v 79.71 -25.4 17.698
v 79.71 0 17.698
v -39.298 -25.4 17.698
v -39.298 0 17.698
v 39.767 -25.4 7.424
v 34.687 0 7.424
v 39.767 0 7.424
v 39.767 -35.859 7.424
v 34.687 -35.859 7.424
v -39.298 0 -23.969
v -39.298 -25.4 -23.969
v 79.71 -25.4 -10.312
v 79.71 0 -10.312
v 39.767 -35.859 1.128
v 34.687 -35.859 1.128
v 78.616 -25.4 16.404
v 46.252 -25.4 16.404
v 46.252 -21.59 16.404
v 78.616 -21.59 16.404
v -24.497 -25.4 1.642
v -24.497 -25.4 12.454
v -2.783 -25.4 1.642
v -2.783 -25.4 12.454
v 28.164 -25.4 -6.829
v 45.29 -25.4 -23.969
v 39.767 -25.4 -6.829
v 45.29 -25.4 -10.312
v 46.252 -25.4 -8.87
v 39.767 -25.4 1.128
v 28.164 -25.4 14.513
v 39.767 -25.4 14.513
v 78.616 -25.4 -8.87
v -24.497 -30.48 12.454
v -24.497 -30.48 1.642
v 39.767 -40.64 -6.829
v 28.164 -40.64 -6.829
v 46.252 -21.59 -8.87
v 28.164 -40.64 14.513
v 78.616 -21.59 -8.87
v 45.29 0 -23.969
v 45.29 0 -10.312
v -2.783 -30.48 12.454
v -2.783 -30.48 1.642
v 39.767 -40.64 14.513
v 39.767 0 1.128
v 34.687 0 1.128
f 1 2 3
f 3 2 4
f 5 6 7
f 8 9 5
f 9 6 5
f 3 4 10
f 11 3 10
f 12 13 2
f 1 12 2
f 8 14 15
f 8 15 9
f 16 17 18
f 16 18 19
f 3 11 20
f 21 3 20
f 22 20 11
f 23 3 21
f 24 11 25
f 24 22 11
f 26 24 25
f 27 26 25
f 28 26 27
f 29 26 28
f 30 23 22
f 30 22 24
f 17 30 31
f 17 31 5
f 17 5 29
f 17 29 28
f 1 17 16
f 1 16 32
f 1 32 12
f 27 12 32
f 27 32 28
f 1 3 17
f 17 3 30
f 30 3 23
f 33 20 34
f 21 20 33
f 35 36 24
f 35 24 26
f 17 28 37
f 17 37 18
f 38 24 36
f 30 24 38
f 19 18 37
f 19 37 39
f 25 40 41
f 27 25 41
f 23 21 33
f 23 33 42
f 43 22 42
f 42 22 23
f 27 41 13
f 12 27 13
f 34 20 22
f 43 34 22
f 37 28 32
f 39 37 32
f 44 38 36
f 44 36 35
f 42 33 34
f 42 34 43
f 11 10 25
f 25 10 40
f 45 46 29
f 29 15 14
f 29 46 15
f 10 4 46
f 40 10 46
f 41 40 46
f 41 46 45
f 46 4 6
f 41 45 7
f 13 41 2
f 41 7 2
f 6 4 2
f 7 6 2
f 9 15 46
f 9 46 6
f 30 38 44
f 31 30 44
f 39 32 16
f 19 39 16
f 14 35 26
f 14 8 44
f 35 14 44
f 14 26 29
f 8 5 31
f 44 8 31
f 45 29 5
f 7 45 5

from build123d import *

# Parameters (mm, degrees)
F0_W      = 34.420416
F0_H      = 28.010136
F1_DEPTH  = 25.4
F2_W      = 21.713977
F2_H      = 10.812225
F3_DEPTH  = 5.08
F4_W      = 32.364089
F4_H      = 25.274814
F5_DEPTH  = 3.81
F6_W      = 11.602566
F6_H      = 21.341514
F7_DEPTH  = 15.24
F8_W      = 10.458534
F8_H      = 6.296051
F9_DEPTH  = 5.08
F10_W     = 5.08
F10_H     = 6.296051
F11_DEPTH = 25.4


with BuildPart() as f1:
    # F0 (on Front) → F1 (new body)
    with BuildSketch(Plane.XZ):
        Polygon((45.290023, 17.697947), (-39.297804, 17.697947), (-39.297804, -23.968874), (45.290023, -23.968874), (45.290023, -10.312189), align=None)
        with Locations((62.500231, 3.692879)):
            Rectangle(F0_W, F0_H)
    extrude(amount=F1_DEPTH)

    # F2 (on face) → F3 (join)
    with BuildSketch(Plane.XZ.offset(25.4)):
        with Locations((-13.639831, 7.048171)):
            Rectangle(F2_W, F2_H)
    extrude(amount=F3_DEPTH)

    # F4 (on face) → F5 (cut)
    with BuildSketch(Plane.XZ.offset(25.4)):
        with Locations((62.433859, 3.767056)):
            Rectangle(F4_W, F4_H)
    extrude(amount=-F5_DEPTH, mode=Mode.SUBTRACT)

    # F6 (on face) → F7 (join)
    with BuildSketch(Plane.XZ.offset(25.4)):
        with Locations((33.965688, 3.841953)):
            Rectangle(F6_W, F6_H)
    extrude(amount=F7_DEPTH)

    # F8 (on face) → F9 (cut)
    with BuildSketch(Plane.YZ.offset(39.766971)):
        with Locations((-30.629267, 4.275792)):
            Rectangle(F8_W, F8_H)
    extrude(amount=-F9_DEPTH, mode=Mode.SUBTRACT)

    # F10 (on face) → F11 (cut)
    with BuildSketch(Plane.XZ.offset(25.4)):
        with Locations((37.226971, 4.275792)):
            Rectangle(F10_W, F10_H)
    extrude(amount=-F11_DEPTH, mode=Mode.SUBTRACT)


solid = f1.part
